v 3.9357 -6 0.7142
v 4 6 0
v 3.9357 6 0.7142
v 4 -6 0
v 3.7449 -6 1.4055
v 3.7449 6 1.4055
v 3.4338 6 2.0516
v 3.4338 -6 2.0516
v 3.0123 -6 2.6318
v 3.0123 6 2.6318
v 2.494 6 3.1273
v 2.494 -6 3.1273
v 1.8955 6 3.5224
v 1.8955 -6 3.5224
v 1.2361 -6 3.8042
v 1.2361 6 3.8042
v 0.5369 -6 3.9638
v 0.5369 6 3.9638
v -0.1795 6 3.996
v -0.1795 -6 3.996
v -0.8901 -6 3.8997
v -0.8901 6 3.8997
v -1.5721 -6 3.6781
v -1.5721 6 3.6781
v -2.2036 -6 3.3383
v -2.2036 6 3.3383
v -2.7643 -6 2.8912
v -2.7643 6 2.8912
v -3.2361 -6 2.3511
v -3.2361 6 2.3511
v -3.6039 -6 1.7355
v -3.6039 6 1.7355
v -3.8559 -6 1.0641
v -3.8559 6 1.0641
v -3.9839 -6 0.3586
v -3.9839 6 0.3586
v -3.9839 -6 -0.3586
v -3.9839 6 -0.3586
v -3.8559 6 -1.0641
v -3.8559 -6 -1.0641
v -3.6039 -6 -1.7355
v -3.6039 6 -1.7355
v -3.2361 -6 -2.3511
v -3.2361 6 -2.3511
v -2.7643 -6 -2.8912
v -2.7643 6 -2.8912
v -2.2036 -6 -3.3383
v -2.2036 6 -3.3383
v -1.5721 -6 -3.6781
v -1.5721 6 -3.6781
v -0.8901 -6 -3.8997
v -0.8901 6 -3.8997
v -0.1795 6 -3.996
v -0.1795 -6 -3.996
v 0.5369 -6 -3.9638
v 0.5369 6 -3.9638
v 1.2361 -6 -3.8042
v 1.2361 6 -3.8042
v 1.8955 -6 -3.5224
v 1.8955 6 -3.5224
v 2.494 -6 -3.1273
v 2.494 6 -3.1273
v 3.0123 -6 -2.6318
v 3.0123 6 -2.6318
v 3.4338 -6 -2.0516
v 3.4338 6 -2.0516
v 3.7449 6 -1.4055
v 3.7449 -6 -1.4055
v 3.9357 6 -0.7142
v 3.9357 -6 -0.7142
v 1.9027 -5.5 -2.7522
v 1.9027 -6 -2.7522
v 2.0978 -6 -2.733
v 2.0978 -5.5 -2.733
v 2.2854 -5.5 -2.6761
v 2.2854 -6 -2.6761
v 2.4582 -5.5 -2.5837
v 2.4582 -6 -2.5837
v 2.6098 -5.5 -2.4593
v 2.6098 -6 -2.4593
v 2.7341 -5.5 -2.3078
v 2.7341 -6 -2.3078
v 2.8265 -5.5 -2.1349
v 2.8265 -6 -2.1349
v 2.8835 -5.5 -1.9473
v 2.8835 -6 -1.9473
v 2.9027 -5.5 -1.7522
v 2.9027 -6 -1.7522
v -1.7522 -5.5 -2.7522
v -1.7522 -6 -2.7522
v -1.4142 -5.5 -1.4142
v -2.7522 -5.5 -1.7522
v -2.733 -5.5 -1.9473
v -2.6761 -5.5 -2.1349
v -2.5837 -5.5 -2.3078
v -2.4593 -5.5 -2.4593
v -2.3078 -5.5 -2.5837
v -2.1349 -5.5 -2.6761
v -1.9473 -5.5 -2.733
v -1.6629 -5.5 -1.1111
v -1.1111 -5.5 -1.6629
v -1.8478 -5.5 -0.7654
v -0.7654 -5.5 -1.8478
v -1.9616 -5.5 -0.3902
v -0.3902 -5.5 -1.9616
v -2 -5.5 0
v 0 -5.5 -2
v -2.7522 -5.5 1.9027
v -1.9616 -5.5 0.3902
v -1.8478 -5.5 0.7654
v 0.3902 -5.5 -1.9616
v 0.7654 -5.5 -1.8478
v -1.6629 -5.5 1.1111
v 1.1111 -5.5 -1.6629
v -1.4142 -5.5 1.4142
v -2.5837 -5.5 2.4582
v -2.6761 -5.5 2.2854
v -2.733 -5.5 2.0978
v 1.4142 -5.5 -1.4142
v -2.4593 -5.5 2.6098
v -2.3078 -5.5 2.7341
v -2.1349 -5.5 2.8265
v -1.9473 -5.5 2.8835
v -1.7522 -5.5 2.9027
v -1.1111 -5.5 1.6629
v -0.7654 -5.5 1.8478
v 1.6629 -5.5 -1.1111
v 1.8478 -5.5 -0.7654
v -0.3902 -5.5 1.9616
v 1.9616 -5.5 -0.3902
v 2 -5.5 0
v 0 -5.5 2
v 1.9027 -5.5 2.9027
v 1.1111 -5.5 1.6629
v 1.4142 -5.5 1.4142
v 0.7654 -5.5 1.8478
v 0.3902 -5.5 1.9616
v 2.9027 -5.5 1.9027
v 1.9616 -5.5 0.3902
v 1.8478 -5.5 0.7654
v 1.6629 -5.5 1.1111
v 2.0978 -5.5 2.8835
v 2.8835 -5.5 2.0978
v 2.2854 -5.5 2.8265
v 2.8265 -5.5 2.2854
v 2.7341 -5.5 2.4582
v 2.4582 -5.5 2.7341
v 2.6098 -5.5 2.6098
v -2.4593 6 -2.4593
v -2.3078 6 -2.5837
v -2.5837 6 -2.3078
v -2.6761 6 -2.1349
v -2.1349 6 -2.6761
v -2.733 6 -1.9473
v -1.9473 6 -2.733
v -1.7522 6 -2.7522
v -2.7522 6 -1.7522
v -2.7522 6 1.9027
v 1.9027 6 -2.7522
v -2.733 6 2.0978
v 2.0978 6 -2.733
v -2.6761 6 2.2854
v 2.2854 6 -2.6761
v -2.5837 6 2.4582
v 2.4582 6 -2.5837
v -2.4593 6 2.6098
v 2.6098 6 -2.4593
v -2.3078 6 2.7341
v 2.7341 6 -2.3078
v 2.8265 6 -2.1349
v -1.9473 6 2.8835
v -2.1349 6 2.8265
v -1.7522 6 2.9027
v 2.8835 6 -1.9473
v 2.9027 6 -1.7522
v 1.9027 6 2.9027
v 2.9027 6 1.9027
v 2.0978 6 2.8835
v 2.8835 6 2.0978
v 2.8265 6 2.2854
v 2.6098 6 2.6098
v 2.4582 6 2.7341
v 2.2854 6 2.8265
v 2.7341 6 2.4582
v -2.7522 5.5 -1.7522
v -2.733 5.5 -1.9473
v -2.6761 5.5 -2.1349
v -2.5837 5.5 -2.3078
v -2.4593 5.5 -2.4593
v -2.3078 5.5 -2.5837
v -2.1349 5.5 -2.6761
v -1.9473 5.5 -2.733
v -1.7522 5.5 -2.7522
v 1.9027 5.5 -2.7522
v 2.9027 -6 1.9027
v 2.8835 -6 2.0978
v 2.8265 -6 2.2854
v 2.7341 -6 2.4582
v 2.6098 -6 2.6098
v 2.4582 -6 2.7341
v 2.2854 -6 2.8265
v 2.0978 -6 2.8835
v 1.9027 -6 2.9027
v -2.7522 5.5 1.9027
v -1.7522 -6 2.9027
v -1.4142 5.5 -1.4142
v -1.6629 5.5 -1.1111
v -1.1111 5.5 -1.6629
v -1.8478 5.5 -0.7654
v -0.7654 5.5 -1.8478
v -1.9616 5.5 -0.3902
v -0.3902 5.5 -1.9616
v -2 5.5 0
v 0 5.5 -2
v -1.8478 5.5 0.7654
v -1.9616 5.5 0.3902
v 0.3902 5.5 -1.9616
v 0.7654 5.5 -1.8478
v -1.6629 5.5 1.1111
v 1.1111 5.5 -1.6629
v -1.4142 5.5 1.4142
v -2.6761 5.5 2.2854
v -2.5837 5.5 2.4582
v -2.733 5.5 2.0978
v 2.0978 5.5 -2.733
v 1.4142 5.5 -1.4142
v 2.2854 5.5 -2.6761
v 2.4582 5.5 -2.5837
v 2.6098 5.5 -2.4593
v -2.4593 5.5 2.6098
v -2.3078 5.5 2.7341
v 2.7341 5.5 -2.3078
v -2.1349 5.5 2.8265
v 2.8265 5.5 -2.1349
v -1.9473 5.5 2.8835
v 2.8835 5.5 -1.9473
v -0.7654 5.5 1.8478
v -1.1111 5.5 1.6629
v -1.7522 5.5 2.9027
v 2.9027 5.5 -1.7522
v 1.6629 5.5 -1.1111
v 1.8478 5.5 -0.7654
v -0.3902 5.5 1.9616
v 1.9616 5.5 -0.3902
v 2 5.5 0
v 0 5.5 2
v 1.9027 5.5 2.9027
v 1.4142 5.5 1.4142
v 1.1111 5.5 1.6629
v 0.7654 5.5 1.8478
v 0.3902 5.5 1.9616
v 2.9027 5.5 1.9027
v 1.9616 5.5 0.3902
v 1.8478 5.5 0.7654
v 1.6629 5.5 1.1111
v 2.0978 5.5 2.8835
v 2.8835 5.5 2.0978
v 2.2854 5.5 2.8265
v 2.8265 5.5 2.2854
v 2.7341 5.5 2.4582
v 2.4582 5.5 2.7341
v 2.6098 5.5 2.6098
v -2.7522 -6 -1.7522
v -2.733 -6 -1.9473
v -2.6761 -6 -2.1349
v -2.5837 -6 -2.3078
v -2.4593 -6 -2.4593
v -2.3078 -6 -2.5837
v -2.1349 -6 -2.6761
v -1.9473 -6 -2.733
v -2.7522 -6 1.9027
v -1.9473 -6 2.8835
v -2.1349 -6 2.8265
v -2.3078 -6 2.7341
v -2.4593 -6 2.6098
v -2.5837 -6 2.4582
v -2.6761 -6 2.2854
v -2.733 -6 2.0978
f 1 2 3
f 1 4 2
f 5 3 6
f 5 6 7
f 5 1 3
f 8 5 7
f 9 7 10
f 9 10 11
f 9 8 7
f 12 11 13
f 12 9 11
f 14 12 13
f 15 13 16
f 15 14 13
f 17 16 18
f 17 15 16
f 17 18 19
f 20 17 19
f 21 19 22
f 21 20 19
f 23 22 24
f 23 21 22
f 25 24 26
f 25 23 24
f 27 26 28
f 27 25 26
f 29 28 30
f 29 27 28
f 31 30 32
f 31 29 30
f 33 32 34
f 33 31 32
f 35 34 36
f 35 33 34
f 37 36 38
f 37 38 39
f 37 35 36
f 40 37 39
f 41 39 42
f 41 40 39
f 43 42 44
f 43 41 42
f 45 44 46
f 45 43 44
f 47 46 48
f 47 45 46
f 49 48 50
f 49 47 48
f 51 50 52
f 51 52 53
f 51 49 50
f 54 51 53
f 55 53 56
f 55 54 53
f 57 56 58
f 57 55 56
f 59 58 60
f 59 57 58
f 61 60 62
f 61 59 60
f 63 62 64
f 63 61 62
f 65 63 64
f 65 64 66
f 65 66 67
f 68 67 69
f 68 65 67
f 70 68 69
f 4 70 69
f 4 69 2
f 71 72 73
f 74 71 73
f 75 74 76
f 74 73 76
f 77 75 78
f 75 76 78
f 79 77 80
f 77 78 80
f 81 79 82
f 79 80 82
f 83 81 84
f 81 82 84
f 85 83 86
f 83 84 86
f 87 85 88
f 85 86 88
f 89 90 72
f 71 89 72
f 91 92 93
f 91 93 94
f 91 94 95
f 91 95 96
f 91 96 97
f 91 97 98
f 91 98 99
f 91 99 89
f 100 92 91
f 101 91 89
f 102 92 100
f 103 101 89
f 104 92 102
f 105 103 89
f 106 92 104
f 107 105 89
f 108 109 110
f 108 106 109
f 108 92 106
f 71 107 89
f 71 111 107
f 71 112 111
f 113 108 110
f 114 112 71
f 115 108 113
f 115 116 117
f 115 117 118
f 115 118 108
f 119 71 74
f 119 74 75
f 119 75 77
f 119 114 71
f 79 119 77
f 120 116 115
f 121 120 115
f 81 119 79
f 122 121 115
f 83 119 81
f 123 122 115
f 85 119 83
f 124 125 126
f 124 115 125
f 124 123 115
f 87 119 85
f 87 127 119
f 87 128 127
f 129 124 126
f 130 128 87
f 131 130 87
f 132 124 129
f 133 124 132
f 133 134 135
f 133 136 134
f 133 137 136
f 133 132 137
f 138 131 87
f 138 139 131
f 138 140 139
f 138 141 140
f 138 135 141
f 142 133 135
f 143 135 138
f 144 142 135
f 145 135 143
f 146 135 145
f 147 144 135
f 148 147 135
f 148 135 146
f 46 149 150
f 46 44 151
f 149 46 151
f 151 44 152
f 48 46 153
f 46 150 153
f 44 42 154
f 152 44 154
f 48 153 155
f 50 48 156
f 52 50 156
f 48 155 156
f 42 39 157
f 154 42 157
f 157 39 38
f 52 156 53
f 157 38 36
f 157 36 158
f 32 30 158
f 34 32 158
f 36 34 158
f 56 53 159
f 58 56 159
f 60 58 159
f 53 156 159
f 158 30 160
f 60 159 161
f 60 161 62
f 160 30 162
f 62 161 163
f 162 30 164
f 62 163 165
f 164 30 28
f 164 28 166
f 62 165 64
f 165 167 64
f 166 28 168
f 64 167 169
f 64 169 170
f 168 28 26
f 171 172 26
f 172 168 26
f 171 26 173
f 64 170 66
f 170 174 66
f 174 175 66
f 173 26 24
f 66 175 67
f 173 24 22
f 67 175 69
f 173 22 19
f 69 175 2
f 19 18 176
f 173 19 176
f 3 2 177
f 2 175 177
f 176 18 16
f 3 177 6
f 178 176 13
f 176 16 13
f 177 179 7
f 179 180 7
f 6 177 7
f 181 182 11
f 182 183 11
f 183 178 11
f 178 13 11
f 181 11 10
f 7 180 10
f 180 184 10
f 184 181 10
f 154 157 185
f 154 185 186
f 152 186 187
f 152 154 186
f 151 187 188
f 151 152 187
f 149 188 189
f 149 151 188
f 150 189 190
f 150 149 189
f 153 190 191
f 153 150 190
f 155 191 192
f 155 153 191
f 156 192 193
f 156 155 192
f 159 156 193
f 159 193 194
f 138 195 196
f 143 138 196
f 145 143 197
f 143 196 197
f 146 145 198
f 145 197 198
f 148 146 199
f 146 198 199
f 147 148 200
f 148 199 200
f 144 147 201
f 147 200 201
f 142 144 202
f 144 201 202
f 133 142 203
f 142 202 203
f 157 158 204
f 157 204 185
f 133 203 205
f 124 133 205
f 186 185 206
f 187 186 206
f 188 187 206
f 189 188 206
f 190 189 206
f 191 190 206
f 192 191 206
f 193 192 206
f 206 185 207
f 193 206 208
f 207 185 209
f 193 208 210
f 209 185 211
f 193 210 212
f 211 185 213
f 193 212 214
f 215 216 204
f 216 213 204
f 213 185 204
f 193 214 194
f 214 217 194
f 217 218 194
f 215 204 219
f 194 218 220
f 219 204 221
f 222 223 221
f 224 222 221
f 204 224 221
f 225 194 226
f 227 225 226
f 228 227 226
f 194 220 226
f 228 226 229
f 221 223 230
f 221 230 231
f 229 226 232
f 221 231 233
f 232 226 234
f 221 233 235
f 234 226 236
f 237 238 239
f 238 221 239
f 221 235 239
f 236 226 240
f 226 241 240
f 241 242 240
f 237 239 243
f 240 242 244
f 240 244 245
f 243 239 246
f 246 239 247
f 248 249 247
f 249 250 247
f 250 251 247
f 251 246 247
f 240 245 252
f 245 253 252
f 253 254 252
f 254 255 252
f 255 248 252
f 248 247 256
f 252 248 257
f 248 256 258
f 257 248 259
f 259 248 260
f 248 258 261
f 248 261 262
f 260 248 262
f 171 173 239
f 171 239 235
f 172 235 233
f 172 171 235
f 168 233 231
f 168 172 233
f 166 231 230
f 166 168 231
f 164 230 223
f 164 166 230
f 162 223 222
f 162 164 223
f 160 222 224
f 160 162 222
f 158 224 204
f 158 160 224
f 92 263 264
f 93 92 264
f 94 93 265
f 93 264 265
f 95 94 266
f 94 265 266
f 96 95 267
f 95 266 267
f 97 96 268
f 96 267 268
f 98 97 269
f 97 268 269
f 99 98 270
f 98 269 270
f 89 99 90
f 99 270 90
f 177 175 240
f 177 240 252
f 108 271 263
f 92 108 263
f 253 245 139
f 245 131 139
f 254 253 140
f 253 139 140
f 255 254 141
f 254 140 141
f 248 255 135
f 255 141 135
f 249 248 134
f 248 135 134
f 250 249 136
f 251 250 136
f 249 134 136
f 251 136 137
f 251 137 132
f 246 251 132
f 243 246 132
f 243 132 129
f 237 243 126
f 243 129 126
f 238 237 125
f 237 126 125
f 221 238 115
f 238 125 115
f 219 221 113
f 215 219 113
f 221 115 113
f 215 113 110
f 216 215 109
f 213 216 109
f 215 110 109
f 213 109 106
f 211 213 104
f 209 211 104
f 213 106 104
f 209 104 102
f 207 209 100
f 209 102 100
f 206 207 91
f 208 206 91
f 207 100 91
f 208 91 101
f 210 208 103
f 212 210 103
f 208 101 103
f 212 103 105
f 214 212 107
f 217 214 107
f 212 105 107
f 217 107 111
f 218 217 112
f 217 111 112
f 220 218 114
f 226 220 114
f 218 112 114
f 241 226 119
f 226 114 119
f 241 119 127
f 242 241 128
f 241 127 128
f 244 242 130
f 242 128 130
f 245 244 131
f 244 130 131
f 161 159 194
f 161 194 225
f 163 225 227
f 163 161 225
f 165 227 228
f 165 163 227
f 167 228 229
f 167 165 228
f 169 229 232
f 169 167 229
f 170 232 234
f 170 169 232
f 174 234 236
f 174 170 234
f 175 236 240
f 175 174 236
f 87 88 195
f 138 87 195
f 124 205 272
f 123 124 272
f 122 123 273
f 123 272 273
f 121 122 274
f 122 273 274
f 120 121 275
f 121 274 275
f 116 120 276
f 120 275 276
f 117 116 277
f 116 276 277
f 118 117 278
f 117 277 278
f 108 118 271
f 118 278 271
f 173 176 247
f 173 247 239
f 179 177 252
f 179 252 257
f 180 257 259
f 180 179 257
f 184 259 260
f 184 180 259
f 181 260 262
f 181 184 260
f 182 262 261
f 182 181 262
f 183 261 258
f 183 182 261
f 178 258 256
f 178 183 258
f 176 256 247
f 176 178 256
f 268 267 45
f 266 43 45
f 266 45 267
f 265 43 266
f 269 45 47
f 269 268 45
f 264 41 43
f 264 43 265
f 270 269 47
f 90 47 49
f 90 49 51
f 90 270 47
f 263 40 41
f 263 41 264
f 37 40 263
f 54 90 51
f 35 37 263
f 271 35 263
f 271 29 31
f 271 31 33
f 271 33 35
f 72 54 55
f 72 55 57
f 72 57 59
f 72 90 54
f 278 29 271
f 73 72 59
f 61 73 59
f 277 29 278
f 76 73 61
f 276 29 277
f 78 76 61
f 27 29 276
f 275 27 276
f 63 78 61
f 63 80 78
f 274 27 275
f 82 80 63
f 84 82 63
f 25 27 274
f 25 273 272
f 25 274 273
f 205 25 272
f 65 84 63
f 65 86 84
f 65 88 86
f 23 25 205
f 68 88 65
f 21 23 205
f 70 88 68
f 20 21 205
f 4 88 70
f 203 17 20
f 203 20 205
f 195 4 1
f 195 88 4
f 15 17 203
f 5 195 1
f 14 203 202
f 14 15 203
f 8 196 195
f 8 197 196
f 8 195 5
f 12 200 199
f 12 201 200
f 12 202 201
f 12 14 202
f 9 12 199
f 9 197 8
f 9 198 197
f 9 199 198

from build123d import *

# Parameters (mm, degrees)
F0_R          = 4
F0_R_2        = 2
F1_DEPTH      = 6
F1_DEPTH_BACK = 6
F2_R          = 2
F3_DEPTH      = 0.5


# Not quite as in the source:
# - a pattern or mirror of a feature is missing from the dataset's text; its kind, count and spacing are read off the source's solid


with BuildPart() as f1:
    # F0 (on Front) → F1 (new body, two sides)
    with BuildSketch(Plane.XZ) as f1_sk:
        Circle(F0_R)
        Circle(F0_R_2, mode=Mode.SUBTRACT)
    extrude(amount=F1_DEPTH)
    extrude(f1_sk.sketch, amount=-F1_DEPTH_BACK)

    # F2 (on face) → F3 (cut)
    with BuildSketch(Plane.XZ.offset(6)):
        with BuildLine():
            Line((1.902670174, 2.902670174), (-1.7521820182, 2.902670174))
            ThreePointArc((-1.7521820182, 2.902670174), (-2.4592887994, 2.6097769551), (-2.7521820182, 1.902670174))
            Line((-2.7521820182, 1.902670174), (-2.7521820182, -1.7521820182))
            ThreePointArc((-2.7521820182, -1.7521820182), (-2.4592887994, -2.4592887994), (-1.7521820182, -2.7521820182))
            Line((-1.7521820182, -2.7521820182), (1.902670174, -2.7521820182))
            ThreePointArc((1.902670174, -2.7521820182), (2.6097769551, -2.4592887994), (2.902670174, -1.7521820182))
            Line((2.902670174, -1.7521820182), (2.902670174, 1.902670174))
            ThreePointArc((2.902670174, 1.902670174), (2.6097769551, 2.6097769551), (1.902670174, 2.902670174))
        make_face()
        Circle(F2_R, mode=Mode.SUBTRACT)
    f3 = extrude(amount=-F3_DEPTH, mode=Mode.SUBTRACT)

    # F3_copies: F3 across plane
    add(f3.mirror(Plane.ZX), mode=Mode.SUBTRACT)


solid = f1.part
